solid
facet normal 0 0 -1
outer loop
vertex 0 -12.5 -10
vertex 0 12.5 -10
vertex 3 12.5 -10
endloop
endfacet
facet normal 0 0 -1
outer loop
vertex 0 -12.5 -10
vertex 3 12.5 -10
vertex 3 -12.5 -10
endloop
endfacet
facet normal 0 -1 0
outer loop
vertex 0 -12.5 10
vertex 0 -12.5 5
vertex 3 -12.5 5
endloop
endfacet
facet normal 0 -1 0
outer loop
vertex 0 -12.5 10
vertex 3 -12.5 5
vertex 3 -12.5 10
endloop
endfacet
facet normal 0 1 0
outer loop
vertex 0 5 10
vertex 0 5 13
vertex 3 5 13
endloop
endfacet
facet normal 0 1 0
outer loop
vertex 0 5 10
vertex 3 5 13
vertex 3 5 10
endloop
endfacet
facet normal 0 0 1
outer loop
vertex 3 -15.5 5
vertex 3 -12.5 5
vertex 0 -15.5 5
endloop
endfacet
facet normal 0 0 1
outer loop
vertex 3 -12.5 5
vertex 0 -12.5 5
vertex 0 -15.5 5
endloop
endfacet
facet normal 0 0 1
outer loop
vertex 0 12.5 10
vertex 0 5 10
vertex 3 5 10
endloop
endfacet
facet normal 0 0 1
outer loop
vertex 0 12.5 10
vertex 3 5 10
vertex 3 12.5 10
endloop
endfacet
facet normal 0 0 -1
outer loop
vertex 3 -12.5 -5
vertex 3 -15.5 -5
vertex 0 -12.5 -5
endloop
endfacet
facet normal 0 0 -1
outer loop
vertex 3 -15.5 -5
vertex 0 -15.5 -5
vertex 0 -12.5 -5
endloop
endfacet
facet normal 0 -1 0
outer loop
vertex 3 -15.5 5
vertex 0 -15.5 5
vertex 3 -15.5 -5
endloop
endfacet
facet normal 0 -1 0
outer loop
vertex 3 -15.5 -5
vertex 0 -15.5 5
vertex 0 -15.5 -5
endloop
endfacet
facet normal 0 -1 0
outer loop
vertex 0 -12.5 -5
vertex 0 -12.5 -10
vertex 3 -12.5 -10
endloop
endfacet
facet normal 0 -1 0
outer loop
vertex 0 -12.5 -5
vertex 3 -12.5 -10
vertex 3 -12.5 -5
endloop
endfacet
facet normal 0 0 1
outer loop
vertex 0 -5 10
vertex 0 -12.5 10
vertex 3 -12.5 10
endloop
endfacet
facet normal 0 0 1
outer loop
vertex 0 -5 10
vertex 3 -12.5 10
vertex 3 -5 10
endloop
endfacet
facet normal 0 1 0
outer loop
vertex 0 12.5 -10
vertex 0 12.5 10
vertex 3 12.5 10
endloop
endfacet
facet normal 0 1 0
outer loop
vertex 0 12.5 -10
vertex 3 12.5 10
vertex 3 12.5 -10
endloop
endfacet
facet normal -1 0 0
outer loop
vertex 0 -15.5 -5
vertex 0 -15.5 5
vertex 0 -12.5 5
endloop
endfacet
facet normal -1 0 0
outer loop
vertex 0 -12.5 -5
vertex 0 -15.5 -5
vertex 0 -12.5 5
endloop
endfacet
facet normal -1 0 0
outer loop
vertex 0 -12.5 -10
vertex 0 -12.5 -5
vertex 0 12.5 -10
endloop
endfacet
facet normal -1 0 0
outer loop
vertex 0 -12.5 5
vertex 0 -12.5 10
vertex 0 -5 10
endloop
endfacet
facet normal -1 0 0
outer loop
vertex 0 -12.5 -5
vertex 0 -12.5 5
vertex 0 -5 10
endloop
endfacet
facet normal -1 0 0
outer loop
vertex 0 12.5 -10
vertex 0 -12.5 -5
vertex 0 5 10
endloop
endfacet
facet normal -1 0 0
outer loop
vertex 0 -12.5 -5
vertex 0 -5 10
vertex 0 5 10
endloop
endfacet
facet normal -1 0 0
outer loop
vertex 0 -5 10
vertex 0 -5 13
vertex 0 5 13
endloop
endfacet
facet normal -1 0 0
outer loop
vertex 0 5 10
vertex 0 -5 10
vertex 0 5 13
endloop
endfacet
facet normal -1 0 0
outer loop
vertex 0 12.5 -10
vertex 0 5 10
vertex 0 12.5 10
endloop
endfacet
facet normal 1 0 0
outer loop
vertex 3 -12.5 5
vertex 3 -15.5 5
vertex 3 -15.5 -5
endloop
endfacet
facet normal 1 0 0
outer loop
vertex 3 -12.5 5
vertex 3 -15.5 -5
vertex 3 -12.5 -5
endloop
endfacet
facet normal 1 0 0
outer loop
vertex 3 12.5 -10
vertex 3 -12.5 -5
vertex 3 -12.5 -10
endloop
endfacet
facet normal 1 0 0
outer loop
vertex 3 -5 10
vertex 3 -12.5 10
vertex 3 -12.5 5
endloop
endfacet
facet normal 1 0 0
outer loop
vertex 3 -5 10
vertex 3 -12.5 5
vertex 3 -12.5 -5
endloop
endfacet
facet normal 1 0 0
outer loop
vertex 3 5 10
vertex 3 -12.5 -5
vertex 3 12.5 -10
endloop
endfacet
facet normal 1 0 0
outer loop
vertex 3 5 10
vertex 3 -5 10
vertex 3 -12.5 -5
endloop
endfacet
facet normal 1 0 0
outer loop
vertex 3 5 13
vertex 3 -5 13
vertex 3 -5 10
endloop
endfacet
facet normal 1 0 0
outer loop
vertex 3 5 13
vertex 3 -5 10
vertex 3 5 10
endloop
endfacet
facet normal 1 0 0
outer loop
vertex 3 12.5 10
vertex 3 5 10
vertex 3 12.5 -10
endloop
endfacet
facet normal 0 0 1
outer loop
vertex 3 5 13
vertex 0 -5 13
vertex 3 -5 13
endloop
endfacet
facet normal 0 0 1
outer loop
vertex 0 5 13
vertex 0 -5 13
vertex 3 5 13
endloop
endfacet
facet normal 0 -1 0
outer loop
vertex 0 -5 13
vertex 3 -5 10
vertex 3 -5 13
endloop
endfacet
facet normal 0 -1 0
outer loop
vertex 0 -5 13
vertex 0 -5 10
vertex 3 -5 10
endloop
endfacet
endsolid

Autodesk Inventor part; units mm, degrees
ref_plane "YZ Plane" through (0, 0, 0) normal (1, 0, 0) x (0, 1, 0)
ref_plane "XZ Plane" through (0, 0, 0) normal (0, 1, 0) x (-1, 0, 0)
ref_plane "XY Plane" through (0, 0, 0) normal (0, 0, 1) x (1, 0, 0)
sketch "Sketch1" plane through (0, 0, 0) normal (1, 0, 0) x (0, 1, 0)
  line L0 (-12.5, 10) -> (12.5, 10)
  line L1 (12.5, 10) -> (12.5, -10)
  line L2 (12.5, -10) -> (-12.5, -10)
  line L3 (-12.5, -10) -> (-12.5, 10)
  line L4 (-12.5, 10) -> (12.5, -10) construction
  line L5 (12.5, 10) -> (-12.5, -10) construction
  line L6 (5, 10) -> (-5, 10)
  line L7 (-5, 10) -> (-5, 13)
  line L8 (-5, 13) -> (5, 13)
  line L9 (5, 13) -> (5, 10)
  line L10 (-12.5, 5) -> (-15.5, 5)
  line L11 (-15.5, 5) -> (-15.5, -5)
  line L12 (-15.5, -5) -> (-12.5, -5)
  line L13 (-12.5, -5) -> (-12.5, 5)
  circle A0 centre (0, -10) radius 10
  point P0 (0, 0)
  point P1 (0, 13)
  point P2 (0, 0)
  dimension "d0" = 25
  dimension "d1" = 20
  dimension "d2" = 10
  dimension "d3" = 3
  dimension "d4" = 3
  dimension "d5" = 10
  dimension "d8" = 5
extrude "Extrusion1" add sketch "Sketch1" along normal blind 3 contours L0 L1 L2 A0 L3 | L7 L8 L9 L0 | L3 L12 L11 L10 | A0 L2 picked at (-0.8971, -4.5365)
properties part number "Back support"
